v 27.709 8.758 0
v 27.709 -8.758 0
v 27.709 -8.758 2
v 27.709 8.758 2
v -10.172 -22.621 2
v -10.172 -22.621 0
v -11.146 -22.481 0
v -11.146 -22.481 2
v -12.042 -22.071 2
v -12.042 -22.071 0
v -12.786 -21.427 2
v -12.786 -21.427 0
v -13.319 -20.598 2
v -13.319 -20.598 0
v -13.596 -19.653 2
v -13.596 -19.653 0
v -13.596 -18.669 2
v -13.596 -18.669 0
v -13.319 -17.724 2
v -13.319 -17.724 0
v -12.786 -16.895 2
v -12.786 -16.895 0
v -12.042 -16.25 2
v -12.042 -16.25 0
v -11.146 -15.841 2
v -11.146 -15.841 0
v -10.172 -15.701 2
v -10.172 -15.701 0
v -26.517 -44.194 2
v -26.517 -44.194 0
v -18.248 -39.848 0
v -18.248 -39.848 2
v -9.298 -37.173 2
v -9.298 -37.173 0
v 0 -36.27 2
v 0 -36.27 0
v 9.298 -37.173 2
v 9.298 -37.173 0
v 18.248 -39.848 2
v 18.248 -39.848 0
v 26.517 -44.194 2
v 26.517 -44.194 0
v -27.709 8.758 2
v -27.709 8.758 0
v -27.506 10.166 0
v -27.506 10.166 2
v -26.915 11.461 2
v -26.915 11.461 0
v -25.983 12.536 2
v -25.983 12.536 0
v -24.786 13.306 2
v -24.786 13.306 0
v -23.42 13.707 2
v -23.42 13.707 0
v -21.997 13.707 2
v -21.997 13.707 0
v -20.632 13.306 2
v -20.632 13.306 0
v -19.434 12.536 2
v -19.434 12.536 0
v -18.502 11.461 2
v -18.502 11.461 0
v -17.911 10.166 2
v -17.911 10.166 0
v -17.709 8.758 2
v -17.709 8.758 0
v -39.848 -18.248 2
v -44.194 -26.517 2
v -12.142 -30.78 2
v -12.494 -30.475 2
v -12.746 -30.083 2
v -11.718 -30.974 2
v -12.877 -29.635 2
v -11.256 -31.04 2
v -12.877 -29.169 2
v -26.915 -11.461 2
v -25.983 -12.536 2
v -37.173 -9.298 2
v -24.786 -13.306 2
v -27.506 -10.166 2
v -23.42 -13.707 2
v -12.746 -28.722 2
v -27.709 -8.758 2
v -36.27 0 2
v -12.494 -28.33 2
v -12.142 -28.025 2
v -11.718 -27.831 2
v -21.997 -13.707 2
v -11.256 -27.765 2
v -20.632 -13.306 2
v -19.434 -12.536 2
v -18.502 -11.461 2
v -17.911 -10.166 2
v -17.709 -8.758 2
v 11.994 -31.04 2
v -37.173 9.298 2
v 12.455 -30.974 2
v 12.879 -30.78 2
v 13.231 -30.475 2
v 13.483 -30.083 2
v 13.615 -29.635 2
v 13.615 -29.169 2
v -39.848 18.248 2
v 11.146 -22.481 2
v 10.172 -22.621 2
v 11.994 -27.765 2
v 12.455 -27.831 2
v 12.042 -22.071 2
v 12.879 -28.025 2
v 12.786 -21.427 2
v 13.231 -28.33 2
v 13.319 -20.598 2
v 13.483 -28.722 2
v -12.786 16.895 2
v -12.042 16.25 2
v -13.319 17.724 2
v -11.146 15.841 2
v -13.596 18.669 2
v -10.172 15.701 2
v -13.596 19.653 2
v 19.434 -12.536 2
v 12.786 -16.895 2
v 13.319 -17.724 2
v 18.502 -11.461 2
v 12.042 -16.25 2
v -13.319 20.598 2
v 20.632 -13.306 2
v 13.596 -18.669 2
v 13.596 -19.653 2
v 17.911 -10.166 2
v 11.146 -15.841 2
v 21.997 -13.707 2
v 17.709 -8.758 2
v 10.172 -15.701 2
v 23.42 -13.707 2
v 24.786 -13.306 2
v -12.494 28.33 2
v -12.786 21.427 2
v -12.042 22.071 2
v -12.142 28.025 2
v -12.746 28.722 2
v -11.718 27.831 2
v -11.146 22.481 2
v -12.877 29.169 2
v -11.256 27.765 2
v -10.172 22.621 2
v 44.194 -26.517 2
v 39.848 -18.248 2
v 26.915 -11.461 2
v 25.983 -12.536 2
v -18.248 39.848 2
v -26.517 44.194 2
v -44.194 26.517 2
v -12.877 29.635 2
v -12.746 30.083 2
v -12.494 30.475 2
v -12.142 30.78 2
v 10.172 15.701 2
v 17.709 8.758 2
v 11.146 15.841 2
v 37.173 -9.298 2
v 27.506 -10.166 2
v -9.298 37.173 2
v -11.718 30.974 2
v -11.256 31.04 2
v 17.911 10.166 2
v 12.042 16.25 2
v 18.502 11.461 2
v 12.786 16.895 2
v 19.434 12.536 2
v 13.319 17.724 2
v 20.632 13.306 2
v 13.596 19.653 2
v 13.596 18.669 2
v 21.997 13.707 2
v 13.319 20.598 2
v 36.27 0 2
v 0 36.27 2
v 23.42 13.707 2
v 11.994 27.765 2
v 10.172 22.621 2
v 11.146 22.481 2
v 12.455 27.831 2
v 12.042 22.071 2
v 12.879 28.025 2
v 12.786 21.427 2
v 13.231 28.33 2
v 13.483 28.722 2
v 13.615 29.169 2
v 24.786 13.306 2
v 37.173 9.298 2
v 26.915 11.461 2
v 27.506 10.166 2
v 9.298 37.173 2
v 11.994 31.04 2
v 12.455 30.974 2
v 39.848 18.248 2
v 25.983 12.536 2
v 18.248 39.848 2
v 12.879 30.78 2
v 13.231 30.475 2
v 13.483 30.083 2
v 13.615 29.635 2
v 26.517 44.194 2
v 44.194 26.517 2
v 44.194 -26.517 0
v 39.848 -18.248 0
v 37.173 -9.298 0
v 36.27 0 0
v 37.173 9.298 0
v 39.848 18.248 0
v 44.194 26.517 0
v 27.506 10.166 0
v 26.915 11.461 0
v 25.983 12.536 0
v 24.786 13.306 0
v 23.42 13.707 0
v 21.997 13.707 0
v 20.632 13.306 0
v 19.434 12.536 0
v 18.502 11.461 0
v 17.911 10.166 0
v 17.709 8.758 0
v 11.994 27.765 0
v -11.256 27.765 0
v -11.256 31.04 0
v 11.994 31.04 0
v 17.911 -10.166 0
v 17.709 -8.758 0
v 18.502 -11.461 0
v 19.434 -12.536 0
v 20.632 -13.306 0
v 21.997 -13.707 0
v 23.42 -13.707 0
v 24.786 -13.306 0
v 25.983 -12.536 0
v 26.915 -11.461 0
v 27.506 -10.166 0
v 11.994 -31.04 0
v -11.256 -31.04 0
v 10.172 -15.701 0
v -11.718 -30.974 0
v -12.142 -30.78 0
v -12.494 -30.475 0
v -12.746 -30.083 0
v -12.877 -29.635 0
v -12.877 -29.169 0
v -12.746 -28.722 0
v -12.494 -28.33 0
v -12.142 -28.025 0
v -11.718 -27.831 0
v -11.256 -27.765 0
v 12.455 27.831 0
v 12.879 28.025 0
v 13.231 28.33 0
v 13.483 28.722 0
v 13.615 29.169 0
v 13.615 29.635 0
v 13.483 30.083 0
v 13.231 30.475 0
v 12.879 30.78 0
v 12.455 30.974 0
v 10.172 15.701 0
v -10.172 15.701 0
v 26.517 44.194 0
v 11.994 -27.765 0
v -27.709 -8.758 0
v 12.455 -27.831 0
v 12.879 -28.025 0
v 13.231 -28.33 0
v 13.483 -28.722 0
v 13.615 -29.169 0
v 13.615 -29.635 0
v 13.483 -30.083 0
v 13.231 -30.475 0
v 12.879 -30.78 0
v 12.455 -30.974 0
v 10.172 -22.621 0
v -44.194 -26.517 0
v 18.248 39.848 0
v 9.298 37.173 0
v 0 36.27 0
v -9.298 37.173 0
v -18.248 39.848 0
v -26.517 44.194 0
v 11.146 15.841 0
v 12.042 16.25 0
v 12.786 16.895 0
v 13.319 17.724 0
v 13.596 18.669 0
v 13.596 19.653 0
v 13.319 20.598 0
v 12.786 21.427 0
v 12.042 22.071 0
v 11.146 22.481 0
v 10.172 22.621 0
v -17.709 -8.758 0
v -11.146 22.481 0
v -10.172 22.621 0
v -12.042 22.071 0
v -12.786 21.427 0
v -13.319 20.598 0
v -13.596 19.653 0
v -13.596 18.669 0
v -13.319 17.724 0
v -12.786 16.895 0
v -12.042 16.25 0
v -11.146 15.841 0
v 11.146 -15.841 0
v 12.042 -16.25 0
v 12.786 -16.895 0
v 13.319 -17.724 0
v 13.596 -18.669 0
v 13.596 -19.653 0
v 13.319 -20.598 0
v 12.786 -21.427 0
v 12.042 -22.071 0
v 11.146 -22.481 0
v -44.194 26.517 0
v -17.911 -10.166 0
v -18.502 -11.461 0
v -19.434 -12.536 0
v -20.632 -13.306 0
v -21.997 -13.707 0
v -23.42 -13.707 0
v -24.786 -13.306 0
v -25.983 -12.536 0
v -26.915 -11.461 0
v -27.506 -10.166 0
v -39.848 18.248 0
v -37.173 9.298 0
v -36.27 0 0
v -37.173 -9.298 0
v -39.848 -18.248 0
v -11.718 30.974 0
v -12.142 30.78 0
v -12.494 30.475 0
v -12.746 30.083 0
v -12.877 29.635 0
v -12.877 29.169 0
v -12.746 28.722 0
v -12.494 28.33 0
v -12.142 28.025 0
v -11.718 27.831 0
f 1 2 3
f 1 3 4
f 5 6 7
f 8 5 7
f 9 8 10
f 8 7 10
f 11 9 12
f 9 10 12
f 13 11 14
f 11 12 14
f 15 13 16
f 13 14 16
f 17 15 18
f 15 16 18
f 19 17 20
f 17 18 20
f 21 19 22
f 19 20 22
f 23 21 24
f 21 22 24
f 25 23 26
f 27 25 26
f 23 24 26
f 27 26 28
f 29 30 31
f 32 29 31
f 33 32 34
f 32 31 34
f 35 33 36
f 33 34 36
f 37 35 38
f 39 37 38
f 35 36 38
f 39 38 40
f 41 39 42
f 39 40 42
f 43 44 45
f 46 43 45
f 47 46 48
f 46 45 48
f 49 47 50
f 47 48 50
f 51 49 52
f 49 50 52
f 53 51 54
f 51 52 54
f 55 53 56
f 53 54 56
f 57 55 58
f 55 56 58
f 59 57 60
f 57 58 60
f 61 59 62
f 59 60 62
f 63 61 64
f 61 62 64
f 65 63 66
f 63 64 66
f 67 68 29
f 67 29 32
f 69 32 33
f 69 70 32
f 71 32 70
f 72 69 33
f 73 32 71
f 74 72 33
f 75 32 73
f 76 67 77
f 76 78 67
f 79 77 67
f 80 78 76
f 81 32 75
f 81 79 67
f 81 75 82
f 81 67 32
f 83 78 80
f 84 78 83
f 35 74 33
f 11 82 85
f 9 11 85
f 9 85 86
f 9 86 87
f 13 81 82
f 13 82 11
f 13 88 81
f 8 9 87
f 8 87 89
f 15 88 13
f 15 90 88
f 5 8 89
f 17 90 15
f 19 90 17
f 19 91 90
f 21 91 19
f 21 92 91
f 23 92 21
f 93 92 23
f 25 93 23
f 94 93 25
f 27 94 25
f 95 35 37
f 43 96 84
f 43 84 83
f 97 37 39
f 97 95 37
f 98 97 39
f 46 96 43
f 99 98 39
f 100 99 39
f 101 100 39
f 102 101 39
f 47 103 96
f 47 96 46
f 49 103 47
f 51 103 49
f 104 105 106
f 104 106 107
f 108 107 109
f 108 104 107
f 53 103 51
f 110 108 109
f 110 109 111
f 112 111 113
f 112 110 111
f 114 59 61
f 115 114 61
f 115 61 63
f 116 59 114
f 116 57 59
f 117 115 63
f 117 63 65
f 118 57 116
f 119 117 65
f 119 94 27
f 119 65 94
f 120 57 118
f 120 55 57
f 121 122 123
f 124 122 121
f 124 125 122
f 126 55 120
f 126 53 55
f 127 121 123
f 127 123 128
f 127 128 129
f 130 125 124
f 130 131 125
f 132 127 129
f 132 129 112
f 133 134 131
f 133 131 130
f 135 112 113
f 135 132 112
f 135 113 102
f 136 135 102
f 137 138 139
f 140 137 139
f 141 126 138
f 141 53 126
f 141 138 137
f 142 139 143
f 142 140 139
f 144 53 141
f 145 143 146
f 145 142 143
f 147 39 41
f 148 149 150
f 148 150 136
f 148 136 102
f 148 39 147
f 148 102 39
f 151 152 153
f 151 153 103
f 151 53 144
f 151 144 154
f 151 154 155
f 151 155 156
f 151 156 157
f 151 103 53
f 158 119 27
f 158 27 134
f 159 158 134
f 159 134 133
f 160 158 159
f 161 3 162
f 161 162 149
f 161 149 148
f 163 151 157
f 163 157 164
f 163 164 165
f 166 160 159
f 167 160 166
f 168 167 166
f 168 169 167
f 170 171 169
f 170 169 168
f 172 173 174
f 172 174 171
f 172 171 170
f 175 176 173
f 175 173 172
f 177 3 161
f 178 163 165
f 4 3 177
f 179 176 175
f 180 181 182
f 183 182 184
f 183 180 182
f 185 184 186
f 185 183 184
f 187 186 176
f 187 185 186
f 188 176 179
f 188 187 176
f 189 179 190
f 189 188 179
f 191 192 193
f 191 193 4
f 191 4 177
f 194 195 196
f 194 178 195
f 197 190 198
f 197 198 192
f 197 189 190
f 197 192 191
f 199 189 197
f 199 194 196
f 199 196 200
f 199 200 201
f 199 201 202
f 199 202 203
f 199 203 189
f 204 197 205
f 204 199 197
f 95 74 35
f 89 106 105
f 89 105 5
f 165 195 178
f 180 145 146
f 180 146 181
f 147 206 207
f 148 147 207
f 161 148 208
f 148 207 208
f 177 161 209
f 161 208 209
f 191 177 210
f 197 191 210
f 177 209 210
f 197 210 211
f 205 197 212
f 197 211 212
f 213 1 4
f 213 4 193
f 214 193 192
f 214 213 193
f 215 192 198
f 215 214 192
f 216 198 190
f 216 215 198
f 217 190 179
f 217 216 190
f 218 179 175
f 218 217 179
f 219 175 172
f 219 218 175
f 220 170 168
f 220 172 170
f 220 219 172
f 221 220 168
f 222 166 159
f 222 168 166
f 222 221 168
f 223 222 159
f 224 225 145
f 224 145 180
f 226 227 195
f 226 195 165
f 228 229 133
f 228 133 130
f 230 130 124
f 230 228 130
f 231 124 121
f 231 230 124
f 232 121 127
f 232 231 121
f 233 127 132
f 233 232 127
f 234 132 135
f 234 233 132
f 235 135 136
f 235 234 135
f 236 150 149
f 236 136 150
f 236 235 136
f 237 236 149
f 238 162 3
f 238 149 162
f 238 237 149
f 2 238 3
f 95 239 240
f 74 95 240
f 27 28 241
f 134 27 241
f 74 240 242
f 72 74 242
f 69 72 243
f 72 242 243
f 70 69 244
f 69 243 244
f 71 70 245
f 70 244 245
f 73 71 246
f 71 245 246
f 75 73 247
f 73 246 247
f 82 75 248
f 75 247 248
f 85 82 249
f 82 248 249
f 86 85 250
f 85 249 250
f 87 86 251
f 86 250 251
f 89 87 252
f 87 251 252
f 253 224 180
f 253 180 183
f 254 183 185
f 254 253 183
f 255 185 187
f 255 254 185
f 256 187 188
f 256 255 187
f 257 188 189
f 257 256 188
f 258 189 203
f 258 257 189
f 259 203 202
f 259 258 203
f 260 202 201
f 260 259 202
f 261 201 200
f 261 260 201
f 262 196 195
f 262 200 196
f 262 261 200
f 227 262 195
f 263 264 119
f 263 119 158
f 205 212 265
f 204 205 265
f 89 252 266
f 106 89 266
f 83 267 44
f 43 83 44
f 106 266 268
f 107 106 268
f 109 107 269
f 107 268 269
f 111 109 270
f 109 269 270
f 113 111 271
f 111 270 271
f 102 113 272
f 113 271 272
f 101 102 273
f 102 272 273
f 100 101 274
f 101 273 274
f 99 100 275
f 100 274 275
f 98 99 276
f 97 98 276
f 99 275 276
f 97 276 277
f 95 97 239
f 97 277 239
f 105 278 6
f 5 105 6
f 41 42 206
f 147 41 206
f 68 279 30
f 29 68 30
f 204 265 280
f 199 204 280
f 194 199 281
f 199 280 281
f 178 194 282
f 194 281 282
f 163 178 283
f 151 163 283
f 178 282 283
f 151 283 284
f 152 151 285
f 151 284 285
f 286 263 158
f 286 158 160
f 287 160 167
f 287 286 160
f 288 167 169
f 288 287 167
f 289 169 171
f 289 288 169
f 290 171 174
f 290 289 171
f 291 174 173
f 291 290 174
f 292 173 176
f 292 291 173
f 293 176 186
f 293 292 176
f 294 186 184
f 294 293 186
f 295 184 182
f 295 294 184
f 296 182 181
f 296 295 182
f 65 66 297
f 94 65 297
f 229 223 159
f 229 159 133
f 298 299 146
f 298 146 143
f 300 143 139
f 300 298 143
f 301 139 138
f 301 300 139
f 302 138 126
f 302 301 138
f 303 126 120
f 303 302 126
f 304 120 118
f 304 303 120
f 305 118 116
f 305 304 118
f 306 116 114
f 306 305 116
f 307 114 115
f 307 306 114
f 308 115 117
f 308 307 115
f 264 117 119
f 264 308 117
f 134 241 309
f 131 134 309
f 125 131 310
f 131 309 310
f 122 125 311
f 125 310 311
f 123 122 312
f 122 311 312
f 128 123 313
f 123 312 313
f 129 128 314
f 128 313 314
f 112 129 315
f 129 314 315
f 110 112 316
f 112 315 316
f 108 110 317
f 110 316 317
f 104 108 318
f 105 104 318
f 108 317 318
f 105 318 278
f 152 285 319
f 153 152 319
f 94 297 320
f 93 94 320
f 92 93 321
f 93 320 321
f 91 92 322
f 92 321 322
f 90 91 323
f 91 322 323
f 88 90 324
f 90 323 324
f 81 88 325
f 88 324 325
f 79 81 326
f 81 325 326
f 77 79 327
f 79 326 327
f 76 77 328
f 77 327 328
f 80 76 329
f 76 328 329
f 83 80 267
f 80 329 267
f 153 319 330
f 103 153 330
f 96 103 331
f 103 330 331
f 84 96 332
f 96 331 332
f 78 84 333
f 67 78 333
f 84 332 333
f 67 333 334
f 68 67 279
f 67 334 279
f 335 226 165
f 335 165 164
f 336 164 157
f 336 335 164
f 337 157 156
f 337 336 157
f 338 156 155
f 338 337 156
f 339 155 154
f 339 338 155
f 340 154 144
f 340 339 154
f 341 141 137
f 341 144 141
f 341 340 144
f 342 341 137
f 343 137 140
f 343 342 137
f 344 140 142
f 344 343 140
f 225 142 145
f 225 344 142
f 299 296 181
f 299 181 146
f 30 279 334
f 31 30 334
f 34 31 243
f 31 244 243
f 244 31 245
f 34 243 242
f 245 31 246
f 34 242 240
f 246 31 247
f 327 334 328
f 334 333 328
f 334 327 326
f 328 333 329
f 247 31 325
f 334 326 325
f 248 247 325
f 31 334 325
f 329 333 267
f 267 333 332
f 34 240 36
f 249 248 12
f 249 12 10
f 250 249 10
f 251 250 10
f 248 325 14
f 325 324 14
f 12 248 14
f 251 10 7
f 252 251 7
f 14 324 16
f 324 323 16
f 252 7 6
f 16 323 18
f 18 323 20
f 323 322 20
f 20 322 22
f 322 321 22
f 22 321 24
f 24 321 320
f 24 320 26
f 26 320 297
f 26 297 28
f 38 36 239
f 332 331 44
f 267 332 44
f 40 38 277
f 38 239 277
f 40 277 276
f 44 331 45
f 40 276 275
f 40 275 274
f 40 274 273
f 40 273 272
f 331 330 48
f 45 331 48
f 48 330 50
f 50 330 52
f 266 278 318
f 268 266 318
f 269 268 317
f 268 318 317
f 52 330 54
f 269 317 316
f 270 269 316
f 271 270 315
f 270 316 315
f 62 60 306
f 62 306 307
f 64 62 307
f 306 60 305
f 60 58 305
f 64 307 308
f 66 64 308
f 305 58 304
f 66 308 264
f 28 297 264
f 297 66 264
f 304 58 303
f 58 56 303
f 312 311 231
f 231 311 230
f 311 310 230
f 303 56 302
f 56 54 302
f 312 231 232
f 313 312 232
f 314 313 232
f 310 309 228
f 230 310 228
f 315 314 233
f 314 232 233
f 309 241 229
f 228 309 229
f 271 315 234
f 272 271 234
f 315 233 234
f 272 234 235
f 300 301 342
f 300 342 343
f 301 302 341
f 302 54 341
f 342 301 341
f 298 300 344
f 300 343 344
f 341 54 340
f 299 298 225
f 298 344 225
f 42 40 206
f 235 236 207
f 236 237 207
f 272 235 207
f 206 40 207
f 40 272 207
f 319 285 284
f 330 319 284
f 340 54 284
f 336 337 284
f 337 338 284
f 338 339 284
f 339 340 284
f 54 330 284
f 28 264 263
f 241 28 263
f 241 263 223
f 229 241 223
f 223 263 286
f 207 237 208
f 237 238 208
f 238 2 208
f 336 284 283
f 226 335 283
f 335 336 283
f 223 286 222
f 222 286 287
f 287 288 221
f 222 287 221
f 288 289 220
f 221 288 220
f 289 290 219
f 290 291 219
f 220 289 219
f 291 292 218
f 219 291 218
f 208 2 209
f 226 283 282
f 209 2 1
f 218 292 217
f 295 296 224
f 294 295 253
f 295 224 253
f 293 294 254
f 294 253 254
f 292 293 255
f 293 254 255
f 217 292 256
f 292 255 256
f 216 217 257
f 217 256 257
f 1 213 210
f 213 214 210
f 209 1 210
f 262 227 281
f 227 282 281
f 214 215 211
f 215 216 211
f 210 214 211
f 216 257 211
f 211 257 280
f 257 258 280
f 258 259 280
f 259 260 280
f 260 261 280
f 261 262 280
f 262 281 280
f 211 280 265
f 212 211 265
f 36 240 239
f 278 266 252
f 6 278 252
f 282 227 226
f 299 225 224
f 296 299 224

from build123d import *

# Parameters (mm, degrees)
BOSS_EXTRUDE1_DEPTH = 2
CUT_EXTRUDE1_DEPTH  = 10


with BuildPart() as part:
    # Sketch1 → Boss-Extrude1 (new body)
    with BuildSketch(Plane.XY):
        with BuildLine():
            Line((-26.516504294, 44.194173824), (-44.194173824, 26.516504294))
            ThreePointArc((-44.194173824, 26.516504294), (-36.270318491, 0), (-44.194173824, -26.516504294))
            Line((-44.194173824, -26.516504294), (-26.516504294, -44.194173824))
            ThreePointArc((-26.516504294, -44.194173824), (0, -36.270318491), (26.516504294, -44.194173824))
            Line((26.516504294, -44.194173824), (44.194173824, -26.516504294))
            ThreePointArc((44.194173824, -26.516504294), (36.270318491, 0), (44.194173824, 26.516504294))
            Line((44.194173824, 26.516504294), (26.516504294, 44.194173824))
            ThreePointArc((26.516504294, 44.194173824), (0, 36.270318491), (-26.516504294, 44.194173824))
        make_face()
    extrude(amount=BOSS_EXTRUDE1_DEPTH)

    # Sketch2 → Cut-Extrude1 (cut)
    with BuildSketch(Plane(origin=(0, 0, 0), x_dir=(-1, 0, 0), z_dir=(0, 0, -1))):
        with BuildLine():
            Line((-27.708756501, -8.757507261), (-27.708756501, 8.757507261))
            ThreePointArc((-27.708756501, 8.757507261), (-22.708756501, 13.757507261), (-17.708756501, 8.757507261))
            Line((-17.708756501, 8.757507261), (-17.708756501, -8.757507261))
            ThreePointArc((-17.708756501, -8.757507261), (-22.708756501, -13.757507261), (-27.708756501, -8.757507261))
        make_face()
        with BuildLine():
            Line((27.708756501, -8.757507261), (27.708756501, 8.757507261))
            ThreePointArc((27.708756501, 8.757507261), (22.708756501, 13.757507261), (17.708756501, 8.757507261))
            Line((17.708756501, 8.757507261), (17.708756501, -8.757507261))
            ThreePointArc((17.708756501, -8.757507261), (22.708756501, -13.757507261), (27.708756501, -8.757507261))
        make_face()
        with BuildLine():
            Line((-10.171642348, 22.620712564), (10.171642348, 22.620712564))
            ThreePointArc((10.171642348, 22.620712564), (13.631363465, 19.160991447), (10.171642348, 15.70127033))
            Line((10.171642348, 15.70127033), (-10.171642348, 15.70127033))
            ThreePointArc((-10.171642348, 15.70127033), (-13.631363465, 19.160991447), (-10.171642348, 22.620712564))
        make_face()
        with BuildLine():
            Line((-11.993928965, 31.0398289), (11.256357494, 31.0398289))
            ThreePointArc((11.256357494, 31.0398289), (12.893791994, 29.402394399), (11.256357494, 27.764959899))
            Line((11.256357494, 27.764959899), (-11.993928965, 27.764959899))
            ThreePointArc((-11.993928965, 27.764959899), (-13.631363465, 29.402394399), (-11.993928965, 31.0398289))
        make_face()
        with BuildLine():
            Line((-10.171642348, -22.620712564), (10.171642348, -22.620712564))
            ThreePointArc((10.171642348, -22.620712564), (13.631363465, -19.160991447), (10.171642348, -15.70127033))
            Line((10.171642348, -15.70127033), (-10.171642348, -15.70127033))
            ThreePointArc((-10.171642348, -15.70127033), (-13.631363465, -19.160991447), (-10.171642348, -22.620712564))
        make_face()
        with BuildLine():
            Line((-11.993928965, -31.0398289), (11.256357494, -31.0398289))
            ThreePointArc((11.256357494, -31.0398289), (12.893791994, -29.402394399), (11.256357494, -27.764959899))
            Line((11.256357494, -27.764959899), (-11.993928965, -27.764959899))
            ThreePointArc((-11.993928965, -27.764959899), (-13.631363465, -29.402394399), (-11.993928965, -31.0398289))
        make_face()
    extrude(amount=-CUT_EXTRUDE1_DEPTH, mode=Mode.SUBTRACT)


solid = part.part
